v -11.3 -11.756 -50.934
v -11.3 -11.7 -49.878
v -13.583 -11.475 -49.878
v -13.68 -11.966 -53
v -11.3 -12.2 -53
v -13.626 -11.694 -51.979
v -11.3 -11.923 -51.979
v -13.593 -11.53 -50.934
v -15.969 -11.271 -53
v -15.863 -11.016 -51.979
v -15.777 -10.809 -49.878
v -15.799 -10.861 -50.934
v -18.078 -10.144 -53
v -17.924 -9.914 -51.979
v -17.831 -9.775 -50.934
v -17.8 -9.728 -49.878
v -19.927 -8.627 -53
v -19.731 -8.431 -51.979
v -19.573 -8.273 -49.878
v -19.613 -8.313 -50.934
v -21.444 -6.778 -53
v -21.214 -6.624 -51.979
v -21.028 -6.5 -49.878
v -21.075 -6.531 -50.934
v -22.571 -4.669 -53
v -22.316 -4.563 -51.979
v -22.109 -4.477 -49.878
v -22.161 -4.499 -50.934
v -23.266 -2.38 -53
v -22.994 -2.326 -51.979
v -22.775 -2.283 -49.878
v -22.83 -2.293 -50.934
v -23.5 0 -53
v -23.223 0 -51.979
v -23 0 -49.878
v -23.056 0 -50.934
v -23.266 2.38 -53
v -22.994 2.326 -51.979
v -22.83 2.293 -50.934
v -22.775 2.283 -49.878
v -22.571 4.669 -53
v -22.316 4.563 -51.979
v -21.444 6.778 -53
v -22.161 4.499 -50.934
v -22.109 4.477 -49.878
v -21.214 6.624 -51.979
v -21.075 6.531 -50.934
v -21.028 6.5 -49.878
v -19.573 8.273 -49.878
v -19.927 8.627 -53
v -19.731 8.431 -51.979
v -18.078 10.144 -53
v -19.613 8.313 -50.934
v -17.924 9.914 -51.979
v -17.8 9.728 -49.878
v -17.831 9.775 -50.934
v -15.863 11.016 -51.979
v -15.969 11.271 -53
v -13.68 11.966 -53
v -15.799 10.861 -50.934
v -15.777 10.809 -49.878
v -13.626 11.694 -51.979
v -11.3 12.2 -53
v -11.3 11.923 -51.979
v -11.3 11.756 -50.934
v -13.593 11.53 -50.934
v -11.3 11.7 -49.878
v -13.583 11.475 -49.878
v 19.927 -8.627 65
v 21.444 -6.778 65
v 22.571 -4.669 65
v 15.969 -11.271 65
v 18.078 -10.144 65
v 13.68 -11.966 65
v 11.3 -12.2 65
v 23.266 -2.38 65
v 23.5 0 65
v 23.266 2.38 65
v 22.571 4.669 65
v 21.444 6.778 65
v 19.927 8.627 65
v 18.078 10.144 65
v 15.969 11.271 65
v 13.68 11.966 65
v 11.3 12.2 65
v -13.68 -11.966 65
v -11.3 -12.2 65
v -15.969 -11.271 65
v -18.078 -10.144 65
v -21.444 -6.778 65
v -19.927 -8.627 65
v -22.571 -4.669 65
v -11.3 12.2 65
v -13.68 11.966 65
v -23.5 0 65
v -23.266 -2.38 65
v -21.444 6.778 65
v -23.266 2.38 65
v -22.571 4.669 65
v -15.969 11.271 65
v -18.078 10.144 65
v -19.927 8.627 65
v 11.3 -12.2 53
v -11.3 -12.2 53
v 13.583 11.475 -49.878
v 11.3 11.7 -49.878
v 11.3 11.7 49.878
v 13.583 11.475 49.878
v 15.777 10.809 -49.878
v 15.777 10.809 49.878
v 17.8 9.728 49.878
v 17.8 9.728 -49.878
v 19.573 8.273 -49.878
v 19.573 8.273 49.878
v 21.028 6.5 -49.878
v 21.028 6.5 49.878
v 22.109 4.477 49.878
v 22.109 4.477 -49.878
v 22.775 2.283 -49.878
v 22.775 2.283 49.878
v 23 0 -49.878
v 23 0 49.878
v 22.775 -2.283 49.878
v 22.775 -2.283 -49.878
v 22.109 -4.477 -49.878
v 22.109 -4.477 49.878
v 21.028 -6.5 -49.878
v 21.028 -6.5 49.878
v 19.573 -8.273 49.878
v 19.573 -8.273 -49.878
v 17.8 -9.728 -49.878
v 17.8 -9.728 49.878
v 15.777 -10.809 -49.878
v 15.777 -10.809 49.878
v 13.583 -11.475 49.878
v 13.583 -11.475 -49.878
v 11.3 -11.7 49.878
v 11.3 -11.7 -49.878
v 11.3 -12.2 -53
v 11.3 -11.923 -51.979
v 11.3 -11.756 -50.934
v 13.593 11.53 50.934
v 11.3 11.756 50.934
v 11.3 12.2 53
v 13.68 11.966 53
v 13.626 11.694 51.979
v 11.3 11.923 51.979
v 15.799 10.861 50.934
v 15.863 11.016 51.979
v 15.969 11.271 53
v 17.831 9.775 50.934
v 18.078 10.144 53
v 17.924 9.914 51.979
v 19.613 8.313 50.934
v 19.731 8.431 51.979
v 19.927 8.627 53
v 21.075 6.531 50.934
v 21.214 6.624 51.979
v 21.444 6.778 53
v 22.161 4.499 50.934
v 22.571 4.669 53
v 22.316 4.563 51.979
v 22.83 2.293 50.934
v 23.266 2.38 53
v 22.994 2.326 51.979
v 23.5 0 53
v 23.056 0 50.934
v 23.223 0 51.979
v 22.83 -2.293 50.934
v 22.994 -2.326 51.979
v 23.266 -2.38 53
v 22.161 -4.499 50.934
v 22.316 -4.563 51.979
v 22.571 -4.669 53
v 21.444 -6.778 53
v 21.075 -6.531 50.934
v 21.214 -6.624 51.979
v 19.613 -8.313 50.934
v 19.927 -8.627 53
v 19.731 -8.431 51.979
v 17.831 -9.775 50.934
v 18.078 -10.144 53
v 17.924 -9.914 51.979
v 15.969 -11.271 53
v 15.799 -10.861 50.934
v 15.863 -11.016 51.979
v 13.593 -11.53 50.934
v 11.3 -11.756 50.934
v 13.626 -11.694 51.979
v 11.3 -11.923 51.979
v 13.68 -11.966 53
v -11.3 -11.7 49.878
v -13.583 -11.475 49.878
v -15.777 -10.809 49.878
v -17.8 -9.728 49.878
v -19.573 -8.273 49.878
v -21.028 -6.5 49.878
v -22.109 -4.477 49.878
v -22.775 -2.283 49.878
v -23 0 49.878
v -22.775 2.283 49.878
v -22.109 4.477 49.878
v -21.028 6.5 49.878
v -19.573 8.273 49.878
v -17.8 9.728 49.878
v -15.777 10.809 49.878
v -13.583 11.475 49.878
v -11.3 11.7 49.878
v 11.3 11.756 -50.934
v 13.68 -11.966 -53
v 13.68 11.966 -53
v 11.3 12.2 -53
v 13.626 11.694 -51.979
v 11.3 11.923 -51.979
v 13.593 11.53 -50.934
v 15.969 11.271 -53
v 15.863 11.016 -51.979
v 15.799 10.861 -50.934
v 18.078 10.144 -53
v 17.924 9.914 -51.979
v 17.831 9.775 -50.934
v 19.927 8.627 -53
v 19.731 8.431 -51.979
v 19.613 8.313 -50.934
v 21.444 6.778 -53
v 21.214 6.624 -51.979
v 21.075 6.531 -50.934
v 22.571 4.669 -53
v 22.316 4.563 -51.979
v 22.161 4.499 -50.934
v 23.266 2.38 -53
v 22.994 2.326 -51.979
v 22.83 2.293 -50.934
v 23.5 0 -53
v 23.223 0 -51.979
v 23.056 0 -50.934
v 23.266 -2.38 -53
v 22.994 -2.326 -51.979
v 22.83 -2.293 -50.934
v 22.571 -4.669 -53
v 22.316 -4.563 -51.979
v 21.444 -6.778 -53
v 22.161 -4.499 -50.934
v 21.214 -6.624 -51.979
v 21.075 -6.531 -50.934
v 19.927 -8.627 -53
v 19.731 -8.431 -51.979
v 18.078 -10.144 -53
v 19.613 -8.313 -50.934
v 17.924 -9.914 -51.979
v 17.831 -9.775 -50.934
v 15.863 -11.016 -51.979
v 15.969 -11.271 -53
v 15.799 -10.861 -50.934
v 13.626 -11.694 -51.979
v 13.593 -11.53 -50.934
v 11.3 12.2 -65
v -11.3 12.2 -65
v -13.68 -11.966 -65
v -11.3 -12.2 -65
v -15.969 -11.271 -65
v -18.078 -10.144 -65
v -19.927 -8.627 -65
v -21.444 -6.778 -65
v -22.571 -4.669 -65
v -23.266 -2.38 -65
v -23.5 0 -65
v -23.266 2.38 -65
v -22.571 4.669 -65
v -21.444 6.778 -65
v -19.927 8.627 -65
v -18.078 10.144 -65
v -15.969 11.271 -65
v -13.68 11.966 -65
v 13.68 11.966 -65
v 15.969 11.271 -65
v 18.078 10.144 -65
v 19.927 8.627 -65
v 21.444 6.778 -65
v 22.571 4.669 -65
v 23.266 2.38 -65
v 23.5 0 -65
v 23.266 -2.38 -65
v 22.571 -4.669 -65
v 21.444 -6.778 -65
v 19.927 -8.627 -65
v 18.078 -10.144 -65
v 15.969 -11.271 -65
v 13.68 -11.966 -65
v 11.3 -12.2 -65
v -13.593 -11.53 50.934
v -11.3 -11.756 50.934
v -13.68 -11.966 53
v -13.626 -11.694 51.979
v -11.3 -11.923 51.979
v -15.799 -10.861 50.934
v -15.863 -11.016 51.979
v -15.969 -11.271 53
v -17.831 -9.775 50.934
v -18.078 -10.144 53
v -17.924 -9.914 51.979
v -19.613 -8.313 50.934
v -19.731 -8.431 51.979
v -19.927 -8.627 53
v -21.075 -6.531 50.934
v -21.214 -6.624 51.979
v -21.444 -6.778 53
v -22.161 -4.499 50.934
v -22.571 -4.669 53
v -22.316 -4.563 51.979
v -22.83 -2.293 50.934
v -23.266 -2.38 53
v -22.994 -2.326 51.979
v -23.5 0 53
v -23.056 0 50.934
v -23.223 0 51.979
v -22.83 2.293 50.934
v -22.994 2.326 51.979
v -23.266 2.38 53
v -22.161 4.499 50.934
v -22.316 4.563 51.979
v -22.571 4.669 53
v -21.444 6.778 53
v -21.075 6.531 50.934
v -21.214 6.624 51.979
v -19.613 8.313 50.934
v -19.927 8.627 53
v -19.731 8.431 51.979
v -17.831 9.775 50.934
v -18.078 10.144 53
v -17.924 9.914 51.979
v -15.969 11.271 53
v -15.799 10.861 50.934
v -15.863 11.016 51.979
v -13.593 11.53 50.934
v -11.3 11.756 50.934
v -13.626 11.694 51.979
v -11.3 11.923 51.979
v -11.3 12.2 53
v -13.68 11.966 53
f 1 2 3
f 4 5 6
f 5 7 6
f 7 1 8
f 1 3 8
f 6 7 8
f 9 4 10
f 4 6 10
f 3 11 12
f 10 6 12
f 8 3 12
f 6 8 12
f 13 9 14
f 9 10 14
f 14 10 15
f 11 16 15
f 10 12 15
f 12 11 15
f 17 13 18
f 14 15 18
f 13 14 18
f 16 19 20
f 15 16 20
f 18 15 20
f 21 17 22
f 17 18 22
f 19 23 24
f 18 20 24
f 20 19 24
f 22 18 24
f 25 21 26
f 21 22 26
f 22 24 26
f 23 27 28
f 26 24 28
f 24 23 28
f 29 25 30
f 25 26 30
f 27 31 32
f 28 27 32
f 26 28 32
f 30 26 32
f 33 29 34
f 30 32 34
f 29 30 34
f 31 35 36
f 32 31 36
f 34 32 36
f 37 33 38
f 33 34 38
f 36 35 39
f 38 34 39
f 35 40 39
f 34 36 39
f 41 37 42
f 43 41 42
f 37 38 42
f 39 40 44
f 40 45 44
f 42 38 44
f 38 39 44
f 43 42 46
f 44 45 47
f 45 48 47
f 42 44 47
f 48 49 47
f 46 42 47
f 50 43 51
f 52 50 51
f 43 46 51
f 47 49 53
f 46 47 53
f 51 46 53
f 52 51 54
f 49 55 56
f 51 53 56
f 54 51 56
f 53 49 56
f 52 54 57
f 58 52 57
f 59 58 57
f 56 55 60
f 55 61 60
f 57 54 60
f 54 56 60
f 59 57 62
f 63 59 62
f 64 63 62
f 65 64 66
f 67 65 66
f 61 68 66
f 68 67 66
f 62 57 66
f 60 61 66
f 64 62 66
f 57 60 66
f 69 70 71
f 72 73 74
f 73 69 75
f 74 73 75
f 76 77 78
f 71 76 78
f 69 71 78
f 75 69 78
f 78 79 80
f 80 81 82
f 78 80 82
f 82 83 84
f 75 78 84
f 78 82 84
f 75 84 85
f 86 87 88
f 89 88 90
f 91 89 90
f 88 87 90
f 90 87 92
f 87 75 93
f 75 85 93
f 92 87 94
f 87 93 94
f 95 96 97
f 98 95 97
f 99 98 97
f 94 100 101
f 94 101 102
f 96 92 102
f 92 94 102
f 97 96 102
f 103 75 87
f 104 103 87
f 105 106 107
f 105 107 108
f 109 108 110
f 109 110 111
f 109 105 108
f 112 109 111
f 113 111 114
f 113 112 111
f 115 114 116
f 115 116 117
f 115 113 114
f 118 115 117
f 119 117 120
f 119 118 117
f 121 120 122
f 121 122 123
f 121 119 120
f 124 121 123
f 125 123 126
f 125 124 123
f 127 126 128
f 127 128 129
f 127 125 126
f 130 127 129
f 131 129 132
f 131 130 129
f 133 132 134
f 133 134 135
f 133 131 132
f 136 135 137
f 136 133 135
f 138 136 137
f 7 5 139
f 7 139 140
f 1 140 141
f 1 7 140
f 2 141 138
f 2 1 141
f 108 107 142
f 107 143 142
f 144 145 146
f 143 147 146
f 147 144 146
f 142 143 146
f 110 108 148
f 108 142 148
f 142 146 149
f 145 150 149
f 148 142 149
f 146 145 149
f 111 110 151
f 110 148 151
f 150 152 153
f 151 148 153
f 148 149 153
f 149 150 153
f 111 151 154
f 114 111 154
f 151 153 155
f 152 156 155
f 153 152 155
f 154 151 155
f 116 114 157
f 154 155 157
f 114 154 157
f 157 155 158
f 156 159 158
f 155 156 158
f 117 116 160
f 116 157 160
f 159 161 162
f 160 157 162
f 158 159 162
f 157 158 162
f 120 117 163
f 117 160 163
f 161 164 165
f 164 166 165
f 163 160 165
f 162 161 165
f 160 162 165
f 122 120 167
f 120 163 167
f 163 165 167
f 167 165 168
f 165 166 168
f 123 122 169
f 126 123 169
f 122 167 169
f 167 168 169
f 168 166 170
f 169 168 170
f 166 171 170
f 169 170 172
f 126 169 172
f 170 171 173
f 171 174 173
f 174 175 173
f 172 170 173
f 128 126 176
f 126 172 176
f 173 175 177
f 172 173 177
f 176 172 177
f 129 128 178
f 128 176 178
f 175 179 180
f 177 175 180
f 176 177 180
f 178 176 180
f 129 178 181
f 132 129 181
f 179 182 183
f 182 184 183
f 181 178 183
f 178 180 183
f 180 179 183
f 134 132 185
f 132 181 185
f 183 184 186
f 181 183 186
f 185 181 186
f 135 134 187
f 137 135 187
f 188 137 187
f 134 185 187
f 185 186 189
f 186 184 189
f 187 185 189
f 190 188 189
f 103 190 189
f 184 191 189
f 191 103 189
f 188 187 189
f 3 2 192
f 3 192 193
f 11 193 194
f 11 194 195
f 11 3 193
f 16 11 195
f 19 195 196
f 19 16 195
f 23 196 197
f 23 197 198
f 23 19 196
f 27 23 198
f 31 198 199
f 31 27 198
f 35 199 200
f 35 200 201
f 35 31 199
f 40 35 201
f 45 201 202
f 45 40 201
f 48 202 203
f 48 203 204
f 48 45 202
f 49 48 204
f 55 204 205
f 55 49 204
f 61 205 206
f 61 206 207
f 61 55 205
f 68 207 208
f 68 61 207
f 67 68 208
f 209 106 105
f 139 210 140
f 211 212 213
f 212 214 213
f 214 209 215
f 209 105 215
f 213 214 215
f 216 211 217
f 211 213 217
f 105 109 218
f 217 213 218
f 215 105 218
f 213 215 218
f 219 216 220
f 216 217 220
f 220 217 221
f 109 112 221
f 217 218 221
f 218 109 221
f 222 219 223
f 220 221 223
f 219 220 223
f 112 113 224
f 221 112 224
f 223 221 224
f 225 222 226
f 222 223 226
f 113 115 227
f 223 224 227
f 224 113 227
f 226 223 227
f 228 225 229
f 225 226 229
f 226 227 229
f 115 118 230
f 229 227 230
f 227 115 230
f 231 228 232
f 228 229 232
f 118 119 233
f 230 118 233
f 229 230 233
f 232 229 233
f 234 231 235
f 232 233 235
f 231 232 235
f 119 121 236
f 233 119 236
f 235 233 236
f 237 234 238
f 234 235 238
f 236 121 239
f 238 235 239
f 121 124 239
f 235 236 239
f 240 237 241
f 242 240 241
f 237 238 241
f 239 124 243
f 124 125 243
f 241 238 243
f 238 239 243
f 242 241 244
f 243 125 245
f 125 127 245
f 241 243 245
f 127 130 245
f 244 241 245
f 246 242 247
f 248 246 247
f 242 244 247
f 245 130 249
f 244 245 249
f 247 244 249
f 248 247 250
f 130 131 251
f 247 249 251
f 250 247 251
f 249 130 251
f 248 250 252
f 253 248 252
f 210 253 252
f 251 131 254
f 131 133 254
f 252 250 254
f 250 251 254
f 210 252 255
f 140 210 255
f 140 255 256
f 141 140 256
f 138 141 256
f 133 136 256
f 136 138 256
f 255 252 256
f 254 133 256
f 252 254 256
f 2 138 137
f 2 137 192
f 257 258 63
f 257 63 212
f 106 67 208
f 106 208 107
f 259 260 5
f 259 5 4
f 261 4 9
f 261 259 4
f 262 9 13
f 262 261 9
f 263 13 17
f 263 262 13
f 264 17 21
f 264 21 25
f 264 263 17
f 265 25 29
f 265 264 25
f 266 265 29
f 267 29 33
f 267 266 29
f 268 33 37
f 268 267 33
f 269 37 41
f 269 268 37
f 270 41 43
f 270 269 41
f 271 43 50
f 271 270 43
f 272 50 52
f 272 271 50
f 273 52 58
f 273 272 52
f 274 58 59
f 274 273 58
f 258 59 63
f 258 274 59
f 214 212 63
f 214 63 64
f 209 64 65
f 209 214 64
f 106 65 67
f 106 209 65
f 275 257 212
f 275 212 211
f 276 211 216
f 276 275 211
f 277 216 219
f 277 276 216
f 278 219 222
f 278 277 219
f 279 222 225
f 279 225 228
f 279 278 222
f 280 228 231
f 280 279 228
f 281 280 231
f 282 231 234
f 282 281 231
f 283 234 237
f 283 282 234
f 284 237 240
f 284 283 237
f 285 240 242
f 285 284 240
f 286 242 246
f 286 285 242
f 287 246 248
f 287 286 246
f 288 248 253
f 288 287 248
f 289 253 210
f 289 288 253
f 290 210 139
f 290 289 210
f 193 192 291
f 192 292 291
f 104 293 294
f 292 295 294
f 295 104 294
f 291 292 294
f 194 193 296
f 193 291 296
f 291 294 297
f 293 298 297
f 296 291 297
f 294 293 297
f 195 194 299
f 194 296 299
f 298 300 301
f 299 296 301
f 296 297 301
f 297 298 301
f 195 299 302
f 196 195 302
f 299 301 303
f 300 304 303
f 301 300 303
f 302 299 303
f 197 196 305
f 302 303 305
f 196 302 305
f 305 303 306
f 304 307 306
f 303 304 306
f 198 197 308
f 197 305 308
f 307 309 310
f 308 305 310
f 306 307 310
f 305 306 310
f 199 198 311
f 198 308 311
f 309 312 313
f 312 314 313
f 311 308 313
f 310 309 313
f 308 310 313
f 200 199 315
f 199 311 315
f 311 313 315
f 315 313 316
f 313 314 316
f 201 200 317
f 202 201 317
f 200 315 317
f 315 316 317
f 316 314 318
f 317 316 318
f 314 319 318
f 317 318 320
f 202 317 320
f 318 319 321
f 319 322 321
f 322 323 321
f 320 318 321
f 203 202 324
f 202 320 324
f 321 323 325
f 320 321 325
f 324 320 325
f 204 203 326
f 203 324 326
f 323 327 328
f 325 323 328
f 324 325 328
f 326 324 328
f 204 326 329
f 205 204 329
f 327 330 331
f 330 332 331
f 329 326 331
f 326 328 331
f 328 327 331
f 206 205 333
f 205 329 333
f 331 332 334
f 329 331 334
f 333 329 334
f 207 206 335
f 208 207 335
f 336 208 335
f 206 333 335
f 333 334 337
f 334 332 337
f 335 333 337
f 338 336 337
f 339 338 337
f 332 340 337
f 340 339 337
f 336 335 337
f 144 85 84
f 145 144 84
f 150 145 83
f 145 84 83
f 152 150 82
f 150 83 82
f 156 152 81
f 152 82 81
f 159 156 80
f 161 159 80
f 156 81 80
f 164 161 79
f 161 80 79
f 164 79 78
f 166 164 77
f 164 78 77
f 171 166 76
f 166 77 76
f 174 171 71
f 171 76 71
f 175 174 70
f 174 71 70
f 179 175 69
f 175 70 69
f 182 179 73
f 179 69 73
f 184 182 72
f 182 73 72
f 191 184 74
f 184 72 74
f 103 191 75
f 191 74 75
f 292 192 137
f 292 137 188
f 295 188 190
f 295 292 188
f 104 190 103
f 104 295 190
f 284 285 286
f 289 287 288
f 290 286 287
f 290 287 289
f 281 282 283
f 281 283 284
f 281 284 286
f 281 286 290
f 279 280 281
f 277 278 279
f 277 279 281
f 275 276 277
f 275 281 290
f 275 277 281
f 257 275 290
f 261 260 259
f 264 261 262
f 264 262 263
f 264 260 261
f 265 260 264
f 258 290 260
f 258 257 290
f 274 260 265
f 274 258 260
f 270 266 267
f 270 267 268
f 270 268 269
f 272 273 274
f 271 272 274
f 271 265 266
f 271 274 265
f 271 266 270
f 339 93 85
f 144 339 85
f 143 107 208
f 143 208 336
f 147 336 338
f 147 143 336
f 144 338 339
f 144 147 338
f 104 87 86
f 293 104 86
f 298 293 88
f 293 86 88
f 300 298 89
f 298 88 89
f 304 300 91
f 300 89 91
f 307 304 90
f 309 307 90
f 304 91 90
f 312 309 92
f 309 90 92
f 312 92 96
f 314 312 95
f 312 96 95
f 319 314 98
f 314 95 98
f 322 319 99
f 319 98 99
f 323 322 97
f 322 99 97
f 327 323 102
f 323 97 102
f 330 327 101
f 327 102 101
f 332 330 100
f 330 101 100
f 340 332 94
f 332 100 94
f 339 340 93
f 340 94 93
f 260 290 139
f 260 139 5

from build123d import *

# Parameters (mm, degrees)
BOSS_EXTRUDE1_DEPTH      = 65
BOSS_EXTRUDE1_DEPTH_BACK = 65
BOSS_EXTRUDE2_DEPTH      = 12
FILLET1_R                = 10
FILLET2_R                = 10


with BuildPart() as part:
    # Sketch1 → Boss-Extrude1 (new, two sides: drawn at the far end of the back side and taken through both)
    with BuildSketch(Plane.XY.offset(-BOSS_EXTRUDE1_DEPTH_BACK)):
        with BuildLine():
            Line((-11.3, 11.7), (11.3, 11.7))
            ThreePointArc((11.3, 11.7), (23, 0), (11.3, -11.7))
            Line((11.3, -11.7), (-11.3, -11.7))
            ThreePointArc((-11.3, -11.7), (-23, 0), (-11.3, 11.7))
        make_face()
    extrude(amount=BOSS_EXTRUDE1_DEPTH + BOSS_EXTRUDE1_DEPTH_BACK)

    # Sketch2 → Boss-Extrude2 (add)
    with BuildSketch(Plane.XY.offset(65)):
        with BuildLine():
            Line((-11.3, 12.2), (11.3, 12.2))
            ThreePointArc((11.3, 12.2), (23.5, 0), (11.3, -12.2))
            Line((11.3, -12.2), (-11.3, -12.2))
            ThreePointArc((-11.3, -12.2), (-23.5, 0), (-11.3, 12.2))
        make_face()
    boss_extrude2 = extrude(amount=-BOSS_EXTRUDE2_DEPTH)

    # Mirror1: Boss-Extrude2 across plane
    add(boss_extrude2.mirror(Plane.XY))

    # Fillet1
    # the kernel refuses this fillet: 10 mm, written as the material it adds along each edge
    with BuildSketch(Plane(origin=(-11.3, -11.7, 53), x_dir=(0, -1.0, -2.188471626126437e-12), z_dir=(1, 0, 0)), Plane(origin=(11.3, 11.7, 53), x_dir=(0, 1.0, -2.188471626126375e-12), z_dir=(-1, 0, 0))) as fillet1_piece_1:
        with BuildLine():
            CenterArc((10, 3.122498999), FILLET1_R, 180, 18.194872339)
            Line((0, 3.122498999), (-0.2, 3.122498999))
            Line((-0.2, 3.122498999), (-0.2, 0))
            Line((-0.2, 0), (0, -0.2))
            ThreePointArc((0, -0.2), (0.25, -0.2), (0.31, -0.06244998))
            Line((0.31, -0.06244998), (0.5, 0))
        make_face()
    extrude(amount=22.6)
    with BuildSketch(Plane(origin=(-11.3, 0, 53), x_dir=(0, -1, 0), z_dir=(1, 0, 0))) as fillet1_piece_2:
        with BuildLine():
            CenterArc((21.7, 3.122498999), FILLET1_R, 180, 18.194872339)
            Line((11.7, 3.122498999), (11.5, 3.122498999))
            Line((11.5, 3.122498999), (11.5, 0))
            Line((11.5, 0), (11.7, -0.2))
            ThreePointArc((11.7, -0.2), (11.95, -0.2), (12.01, -0.06244998))
            Line((12.01, -0.06244998), (12.2, 0))
        make_face()
    revolve(axis=Axis((-11.3, 0, 53), (0, 0, -1)), revolution_arc=180)
    with BuildSketch(Plane(origin=(11.3, 0, 53), x_dir=(0, 1, 0), z_dir=(-1, 0, 0))) as fillet1_piece_3:
        with BuildLine():
            CenterArc((21.7, 3.122498999), FILLET1_R, 180, 18.194872339)
            Line((11.7, 3.122498999), (11.5, 3.122498999))
            Line((11.5, 3.122498999), (11.5, 0))
            Line((11.5, 0), (11.7, -0.2))
            ThreePointArc((11.7, -0.2), (11.95, -0.2), (12.01, -0.06244998))
            Line((12.01, -0.06244998), (12.2, 0))
        make_face()
    revolve(axis=Axis((11.3, 0, 53), (0, 0, -1)), revolution_arc=180)

    # Fillet2
    # the kernel refuses this fillet: 10 mm, written as the material it adds along each edge
    with BuildSketch(Plane(origin=(-11.3, -11.7, -53), x_dir=(0, -1.0, 2.188471626126437e-12), z_dir=(1, 0, 0))) as fillet2_piece_1:
        with BuildLine():
            CenterArc((10, -3.122498999), FILLET2_R, 161.805127661, 18.194872339)
            Line((0, -3.122498999), (-0.2, -3.122498999))
            Line((-0.2, -3.122498999), (-0.2, 0))
            Line((-0.2, 0), (0, 0.2))
            ThreePointArc((0, 0.2), (0.25, 0.2), (0.31, 0.06244998))
            Line((0.31, 0.06244998), (0.5, 0))
        make_face()
    extrude(amount=22.6)
    with BuildSketch(Plane(origin=(11.3, 11.7, -53), x_dir=(0, 0, 1), z_dir=(-1, 0, 0))) as fillet2_piece_2:
        with BuildLine():
            CenterArc((3.122498999, 10), FILLET2_R, 251.805127661, 18.194872339)
            Line((0, 0.5), (-0.06244998, 0.31))
            ThreePointArc((-0.06244998, 0.31), (-0.2, 0.25), (-0.2, 0))
            Line((-0.2, 0), (0, -0.2))
            Line((0, -0.2), (3.122498999, -0.2))
            Line((3.122498999, -0.2), (3.122498999, 0))
        make_face()
    extrude(amount=22.6)
    with BuildSketch(Plane(origin=(-11.3, 0, -53), x_dir=(0, -1, 0), z_dir=(1, 0, 0))) as fillet2_piece_3:
        with BuildLine():
            CenterArc((21.7, -3.122498999), FILLET2_R, 161.805127661, 18.194872339)
            Line((11.7, -3.122498999), (11.5, -3.122498999))
            Line((11.5, -3.122498999), (11.5, 0))
            Line((11.5, 0), (11.7, 0.2))
            ThreePointArc((11.7, 0.2), (11.95, 0.2), (12.01, 0.06244998))
            Line((12.01, 0.06244998), (12.2, 0))
        make_face()
    revolve(axis=Axis((-11.3, 0, -53), (0, 0, -1)), revolution_arc=180)
    with BuildSketch(Plane(origin=(11.3, 0, -53), x_dir=(0, 1, 0), z_dir=(-1, 0, 0))) as fillet2_piece_4:
        with BuildLine():
            CenterArc((21.7, -3.122498999), FILLET2_R, 161.805127661, 18.194872339)
            Line((12.2, 0), (12.01, 0.06244998))
            ThreePointArc((12.01, 0.06244998), (11.95, 0.2), (11.7, 0.2))
            Line((11.7, 0.2), (11.5, 0))
            Line((11.5, 0), (11.5, -3.122498999))
            Line((11.5, -3.122498999), (11.7, -3.122498999))
        make_face()
    revolve(axis=Axis((11.3, 0, -53), (0, 0, -1)), revolution_arc=180)


solid = part.part
